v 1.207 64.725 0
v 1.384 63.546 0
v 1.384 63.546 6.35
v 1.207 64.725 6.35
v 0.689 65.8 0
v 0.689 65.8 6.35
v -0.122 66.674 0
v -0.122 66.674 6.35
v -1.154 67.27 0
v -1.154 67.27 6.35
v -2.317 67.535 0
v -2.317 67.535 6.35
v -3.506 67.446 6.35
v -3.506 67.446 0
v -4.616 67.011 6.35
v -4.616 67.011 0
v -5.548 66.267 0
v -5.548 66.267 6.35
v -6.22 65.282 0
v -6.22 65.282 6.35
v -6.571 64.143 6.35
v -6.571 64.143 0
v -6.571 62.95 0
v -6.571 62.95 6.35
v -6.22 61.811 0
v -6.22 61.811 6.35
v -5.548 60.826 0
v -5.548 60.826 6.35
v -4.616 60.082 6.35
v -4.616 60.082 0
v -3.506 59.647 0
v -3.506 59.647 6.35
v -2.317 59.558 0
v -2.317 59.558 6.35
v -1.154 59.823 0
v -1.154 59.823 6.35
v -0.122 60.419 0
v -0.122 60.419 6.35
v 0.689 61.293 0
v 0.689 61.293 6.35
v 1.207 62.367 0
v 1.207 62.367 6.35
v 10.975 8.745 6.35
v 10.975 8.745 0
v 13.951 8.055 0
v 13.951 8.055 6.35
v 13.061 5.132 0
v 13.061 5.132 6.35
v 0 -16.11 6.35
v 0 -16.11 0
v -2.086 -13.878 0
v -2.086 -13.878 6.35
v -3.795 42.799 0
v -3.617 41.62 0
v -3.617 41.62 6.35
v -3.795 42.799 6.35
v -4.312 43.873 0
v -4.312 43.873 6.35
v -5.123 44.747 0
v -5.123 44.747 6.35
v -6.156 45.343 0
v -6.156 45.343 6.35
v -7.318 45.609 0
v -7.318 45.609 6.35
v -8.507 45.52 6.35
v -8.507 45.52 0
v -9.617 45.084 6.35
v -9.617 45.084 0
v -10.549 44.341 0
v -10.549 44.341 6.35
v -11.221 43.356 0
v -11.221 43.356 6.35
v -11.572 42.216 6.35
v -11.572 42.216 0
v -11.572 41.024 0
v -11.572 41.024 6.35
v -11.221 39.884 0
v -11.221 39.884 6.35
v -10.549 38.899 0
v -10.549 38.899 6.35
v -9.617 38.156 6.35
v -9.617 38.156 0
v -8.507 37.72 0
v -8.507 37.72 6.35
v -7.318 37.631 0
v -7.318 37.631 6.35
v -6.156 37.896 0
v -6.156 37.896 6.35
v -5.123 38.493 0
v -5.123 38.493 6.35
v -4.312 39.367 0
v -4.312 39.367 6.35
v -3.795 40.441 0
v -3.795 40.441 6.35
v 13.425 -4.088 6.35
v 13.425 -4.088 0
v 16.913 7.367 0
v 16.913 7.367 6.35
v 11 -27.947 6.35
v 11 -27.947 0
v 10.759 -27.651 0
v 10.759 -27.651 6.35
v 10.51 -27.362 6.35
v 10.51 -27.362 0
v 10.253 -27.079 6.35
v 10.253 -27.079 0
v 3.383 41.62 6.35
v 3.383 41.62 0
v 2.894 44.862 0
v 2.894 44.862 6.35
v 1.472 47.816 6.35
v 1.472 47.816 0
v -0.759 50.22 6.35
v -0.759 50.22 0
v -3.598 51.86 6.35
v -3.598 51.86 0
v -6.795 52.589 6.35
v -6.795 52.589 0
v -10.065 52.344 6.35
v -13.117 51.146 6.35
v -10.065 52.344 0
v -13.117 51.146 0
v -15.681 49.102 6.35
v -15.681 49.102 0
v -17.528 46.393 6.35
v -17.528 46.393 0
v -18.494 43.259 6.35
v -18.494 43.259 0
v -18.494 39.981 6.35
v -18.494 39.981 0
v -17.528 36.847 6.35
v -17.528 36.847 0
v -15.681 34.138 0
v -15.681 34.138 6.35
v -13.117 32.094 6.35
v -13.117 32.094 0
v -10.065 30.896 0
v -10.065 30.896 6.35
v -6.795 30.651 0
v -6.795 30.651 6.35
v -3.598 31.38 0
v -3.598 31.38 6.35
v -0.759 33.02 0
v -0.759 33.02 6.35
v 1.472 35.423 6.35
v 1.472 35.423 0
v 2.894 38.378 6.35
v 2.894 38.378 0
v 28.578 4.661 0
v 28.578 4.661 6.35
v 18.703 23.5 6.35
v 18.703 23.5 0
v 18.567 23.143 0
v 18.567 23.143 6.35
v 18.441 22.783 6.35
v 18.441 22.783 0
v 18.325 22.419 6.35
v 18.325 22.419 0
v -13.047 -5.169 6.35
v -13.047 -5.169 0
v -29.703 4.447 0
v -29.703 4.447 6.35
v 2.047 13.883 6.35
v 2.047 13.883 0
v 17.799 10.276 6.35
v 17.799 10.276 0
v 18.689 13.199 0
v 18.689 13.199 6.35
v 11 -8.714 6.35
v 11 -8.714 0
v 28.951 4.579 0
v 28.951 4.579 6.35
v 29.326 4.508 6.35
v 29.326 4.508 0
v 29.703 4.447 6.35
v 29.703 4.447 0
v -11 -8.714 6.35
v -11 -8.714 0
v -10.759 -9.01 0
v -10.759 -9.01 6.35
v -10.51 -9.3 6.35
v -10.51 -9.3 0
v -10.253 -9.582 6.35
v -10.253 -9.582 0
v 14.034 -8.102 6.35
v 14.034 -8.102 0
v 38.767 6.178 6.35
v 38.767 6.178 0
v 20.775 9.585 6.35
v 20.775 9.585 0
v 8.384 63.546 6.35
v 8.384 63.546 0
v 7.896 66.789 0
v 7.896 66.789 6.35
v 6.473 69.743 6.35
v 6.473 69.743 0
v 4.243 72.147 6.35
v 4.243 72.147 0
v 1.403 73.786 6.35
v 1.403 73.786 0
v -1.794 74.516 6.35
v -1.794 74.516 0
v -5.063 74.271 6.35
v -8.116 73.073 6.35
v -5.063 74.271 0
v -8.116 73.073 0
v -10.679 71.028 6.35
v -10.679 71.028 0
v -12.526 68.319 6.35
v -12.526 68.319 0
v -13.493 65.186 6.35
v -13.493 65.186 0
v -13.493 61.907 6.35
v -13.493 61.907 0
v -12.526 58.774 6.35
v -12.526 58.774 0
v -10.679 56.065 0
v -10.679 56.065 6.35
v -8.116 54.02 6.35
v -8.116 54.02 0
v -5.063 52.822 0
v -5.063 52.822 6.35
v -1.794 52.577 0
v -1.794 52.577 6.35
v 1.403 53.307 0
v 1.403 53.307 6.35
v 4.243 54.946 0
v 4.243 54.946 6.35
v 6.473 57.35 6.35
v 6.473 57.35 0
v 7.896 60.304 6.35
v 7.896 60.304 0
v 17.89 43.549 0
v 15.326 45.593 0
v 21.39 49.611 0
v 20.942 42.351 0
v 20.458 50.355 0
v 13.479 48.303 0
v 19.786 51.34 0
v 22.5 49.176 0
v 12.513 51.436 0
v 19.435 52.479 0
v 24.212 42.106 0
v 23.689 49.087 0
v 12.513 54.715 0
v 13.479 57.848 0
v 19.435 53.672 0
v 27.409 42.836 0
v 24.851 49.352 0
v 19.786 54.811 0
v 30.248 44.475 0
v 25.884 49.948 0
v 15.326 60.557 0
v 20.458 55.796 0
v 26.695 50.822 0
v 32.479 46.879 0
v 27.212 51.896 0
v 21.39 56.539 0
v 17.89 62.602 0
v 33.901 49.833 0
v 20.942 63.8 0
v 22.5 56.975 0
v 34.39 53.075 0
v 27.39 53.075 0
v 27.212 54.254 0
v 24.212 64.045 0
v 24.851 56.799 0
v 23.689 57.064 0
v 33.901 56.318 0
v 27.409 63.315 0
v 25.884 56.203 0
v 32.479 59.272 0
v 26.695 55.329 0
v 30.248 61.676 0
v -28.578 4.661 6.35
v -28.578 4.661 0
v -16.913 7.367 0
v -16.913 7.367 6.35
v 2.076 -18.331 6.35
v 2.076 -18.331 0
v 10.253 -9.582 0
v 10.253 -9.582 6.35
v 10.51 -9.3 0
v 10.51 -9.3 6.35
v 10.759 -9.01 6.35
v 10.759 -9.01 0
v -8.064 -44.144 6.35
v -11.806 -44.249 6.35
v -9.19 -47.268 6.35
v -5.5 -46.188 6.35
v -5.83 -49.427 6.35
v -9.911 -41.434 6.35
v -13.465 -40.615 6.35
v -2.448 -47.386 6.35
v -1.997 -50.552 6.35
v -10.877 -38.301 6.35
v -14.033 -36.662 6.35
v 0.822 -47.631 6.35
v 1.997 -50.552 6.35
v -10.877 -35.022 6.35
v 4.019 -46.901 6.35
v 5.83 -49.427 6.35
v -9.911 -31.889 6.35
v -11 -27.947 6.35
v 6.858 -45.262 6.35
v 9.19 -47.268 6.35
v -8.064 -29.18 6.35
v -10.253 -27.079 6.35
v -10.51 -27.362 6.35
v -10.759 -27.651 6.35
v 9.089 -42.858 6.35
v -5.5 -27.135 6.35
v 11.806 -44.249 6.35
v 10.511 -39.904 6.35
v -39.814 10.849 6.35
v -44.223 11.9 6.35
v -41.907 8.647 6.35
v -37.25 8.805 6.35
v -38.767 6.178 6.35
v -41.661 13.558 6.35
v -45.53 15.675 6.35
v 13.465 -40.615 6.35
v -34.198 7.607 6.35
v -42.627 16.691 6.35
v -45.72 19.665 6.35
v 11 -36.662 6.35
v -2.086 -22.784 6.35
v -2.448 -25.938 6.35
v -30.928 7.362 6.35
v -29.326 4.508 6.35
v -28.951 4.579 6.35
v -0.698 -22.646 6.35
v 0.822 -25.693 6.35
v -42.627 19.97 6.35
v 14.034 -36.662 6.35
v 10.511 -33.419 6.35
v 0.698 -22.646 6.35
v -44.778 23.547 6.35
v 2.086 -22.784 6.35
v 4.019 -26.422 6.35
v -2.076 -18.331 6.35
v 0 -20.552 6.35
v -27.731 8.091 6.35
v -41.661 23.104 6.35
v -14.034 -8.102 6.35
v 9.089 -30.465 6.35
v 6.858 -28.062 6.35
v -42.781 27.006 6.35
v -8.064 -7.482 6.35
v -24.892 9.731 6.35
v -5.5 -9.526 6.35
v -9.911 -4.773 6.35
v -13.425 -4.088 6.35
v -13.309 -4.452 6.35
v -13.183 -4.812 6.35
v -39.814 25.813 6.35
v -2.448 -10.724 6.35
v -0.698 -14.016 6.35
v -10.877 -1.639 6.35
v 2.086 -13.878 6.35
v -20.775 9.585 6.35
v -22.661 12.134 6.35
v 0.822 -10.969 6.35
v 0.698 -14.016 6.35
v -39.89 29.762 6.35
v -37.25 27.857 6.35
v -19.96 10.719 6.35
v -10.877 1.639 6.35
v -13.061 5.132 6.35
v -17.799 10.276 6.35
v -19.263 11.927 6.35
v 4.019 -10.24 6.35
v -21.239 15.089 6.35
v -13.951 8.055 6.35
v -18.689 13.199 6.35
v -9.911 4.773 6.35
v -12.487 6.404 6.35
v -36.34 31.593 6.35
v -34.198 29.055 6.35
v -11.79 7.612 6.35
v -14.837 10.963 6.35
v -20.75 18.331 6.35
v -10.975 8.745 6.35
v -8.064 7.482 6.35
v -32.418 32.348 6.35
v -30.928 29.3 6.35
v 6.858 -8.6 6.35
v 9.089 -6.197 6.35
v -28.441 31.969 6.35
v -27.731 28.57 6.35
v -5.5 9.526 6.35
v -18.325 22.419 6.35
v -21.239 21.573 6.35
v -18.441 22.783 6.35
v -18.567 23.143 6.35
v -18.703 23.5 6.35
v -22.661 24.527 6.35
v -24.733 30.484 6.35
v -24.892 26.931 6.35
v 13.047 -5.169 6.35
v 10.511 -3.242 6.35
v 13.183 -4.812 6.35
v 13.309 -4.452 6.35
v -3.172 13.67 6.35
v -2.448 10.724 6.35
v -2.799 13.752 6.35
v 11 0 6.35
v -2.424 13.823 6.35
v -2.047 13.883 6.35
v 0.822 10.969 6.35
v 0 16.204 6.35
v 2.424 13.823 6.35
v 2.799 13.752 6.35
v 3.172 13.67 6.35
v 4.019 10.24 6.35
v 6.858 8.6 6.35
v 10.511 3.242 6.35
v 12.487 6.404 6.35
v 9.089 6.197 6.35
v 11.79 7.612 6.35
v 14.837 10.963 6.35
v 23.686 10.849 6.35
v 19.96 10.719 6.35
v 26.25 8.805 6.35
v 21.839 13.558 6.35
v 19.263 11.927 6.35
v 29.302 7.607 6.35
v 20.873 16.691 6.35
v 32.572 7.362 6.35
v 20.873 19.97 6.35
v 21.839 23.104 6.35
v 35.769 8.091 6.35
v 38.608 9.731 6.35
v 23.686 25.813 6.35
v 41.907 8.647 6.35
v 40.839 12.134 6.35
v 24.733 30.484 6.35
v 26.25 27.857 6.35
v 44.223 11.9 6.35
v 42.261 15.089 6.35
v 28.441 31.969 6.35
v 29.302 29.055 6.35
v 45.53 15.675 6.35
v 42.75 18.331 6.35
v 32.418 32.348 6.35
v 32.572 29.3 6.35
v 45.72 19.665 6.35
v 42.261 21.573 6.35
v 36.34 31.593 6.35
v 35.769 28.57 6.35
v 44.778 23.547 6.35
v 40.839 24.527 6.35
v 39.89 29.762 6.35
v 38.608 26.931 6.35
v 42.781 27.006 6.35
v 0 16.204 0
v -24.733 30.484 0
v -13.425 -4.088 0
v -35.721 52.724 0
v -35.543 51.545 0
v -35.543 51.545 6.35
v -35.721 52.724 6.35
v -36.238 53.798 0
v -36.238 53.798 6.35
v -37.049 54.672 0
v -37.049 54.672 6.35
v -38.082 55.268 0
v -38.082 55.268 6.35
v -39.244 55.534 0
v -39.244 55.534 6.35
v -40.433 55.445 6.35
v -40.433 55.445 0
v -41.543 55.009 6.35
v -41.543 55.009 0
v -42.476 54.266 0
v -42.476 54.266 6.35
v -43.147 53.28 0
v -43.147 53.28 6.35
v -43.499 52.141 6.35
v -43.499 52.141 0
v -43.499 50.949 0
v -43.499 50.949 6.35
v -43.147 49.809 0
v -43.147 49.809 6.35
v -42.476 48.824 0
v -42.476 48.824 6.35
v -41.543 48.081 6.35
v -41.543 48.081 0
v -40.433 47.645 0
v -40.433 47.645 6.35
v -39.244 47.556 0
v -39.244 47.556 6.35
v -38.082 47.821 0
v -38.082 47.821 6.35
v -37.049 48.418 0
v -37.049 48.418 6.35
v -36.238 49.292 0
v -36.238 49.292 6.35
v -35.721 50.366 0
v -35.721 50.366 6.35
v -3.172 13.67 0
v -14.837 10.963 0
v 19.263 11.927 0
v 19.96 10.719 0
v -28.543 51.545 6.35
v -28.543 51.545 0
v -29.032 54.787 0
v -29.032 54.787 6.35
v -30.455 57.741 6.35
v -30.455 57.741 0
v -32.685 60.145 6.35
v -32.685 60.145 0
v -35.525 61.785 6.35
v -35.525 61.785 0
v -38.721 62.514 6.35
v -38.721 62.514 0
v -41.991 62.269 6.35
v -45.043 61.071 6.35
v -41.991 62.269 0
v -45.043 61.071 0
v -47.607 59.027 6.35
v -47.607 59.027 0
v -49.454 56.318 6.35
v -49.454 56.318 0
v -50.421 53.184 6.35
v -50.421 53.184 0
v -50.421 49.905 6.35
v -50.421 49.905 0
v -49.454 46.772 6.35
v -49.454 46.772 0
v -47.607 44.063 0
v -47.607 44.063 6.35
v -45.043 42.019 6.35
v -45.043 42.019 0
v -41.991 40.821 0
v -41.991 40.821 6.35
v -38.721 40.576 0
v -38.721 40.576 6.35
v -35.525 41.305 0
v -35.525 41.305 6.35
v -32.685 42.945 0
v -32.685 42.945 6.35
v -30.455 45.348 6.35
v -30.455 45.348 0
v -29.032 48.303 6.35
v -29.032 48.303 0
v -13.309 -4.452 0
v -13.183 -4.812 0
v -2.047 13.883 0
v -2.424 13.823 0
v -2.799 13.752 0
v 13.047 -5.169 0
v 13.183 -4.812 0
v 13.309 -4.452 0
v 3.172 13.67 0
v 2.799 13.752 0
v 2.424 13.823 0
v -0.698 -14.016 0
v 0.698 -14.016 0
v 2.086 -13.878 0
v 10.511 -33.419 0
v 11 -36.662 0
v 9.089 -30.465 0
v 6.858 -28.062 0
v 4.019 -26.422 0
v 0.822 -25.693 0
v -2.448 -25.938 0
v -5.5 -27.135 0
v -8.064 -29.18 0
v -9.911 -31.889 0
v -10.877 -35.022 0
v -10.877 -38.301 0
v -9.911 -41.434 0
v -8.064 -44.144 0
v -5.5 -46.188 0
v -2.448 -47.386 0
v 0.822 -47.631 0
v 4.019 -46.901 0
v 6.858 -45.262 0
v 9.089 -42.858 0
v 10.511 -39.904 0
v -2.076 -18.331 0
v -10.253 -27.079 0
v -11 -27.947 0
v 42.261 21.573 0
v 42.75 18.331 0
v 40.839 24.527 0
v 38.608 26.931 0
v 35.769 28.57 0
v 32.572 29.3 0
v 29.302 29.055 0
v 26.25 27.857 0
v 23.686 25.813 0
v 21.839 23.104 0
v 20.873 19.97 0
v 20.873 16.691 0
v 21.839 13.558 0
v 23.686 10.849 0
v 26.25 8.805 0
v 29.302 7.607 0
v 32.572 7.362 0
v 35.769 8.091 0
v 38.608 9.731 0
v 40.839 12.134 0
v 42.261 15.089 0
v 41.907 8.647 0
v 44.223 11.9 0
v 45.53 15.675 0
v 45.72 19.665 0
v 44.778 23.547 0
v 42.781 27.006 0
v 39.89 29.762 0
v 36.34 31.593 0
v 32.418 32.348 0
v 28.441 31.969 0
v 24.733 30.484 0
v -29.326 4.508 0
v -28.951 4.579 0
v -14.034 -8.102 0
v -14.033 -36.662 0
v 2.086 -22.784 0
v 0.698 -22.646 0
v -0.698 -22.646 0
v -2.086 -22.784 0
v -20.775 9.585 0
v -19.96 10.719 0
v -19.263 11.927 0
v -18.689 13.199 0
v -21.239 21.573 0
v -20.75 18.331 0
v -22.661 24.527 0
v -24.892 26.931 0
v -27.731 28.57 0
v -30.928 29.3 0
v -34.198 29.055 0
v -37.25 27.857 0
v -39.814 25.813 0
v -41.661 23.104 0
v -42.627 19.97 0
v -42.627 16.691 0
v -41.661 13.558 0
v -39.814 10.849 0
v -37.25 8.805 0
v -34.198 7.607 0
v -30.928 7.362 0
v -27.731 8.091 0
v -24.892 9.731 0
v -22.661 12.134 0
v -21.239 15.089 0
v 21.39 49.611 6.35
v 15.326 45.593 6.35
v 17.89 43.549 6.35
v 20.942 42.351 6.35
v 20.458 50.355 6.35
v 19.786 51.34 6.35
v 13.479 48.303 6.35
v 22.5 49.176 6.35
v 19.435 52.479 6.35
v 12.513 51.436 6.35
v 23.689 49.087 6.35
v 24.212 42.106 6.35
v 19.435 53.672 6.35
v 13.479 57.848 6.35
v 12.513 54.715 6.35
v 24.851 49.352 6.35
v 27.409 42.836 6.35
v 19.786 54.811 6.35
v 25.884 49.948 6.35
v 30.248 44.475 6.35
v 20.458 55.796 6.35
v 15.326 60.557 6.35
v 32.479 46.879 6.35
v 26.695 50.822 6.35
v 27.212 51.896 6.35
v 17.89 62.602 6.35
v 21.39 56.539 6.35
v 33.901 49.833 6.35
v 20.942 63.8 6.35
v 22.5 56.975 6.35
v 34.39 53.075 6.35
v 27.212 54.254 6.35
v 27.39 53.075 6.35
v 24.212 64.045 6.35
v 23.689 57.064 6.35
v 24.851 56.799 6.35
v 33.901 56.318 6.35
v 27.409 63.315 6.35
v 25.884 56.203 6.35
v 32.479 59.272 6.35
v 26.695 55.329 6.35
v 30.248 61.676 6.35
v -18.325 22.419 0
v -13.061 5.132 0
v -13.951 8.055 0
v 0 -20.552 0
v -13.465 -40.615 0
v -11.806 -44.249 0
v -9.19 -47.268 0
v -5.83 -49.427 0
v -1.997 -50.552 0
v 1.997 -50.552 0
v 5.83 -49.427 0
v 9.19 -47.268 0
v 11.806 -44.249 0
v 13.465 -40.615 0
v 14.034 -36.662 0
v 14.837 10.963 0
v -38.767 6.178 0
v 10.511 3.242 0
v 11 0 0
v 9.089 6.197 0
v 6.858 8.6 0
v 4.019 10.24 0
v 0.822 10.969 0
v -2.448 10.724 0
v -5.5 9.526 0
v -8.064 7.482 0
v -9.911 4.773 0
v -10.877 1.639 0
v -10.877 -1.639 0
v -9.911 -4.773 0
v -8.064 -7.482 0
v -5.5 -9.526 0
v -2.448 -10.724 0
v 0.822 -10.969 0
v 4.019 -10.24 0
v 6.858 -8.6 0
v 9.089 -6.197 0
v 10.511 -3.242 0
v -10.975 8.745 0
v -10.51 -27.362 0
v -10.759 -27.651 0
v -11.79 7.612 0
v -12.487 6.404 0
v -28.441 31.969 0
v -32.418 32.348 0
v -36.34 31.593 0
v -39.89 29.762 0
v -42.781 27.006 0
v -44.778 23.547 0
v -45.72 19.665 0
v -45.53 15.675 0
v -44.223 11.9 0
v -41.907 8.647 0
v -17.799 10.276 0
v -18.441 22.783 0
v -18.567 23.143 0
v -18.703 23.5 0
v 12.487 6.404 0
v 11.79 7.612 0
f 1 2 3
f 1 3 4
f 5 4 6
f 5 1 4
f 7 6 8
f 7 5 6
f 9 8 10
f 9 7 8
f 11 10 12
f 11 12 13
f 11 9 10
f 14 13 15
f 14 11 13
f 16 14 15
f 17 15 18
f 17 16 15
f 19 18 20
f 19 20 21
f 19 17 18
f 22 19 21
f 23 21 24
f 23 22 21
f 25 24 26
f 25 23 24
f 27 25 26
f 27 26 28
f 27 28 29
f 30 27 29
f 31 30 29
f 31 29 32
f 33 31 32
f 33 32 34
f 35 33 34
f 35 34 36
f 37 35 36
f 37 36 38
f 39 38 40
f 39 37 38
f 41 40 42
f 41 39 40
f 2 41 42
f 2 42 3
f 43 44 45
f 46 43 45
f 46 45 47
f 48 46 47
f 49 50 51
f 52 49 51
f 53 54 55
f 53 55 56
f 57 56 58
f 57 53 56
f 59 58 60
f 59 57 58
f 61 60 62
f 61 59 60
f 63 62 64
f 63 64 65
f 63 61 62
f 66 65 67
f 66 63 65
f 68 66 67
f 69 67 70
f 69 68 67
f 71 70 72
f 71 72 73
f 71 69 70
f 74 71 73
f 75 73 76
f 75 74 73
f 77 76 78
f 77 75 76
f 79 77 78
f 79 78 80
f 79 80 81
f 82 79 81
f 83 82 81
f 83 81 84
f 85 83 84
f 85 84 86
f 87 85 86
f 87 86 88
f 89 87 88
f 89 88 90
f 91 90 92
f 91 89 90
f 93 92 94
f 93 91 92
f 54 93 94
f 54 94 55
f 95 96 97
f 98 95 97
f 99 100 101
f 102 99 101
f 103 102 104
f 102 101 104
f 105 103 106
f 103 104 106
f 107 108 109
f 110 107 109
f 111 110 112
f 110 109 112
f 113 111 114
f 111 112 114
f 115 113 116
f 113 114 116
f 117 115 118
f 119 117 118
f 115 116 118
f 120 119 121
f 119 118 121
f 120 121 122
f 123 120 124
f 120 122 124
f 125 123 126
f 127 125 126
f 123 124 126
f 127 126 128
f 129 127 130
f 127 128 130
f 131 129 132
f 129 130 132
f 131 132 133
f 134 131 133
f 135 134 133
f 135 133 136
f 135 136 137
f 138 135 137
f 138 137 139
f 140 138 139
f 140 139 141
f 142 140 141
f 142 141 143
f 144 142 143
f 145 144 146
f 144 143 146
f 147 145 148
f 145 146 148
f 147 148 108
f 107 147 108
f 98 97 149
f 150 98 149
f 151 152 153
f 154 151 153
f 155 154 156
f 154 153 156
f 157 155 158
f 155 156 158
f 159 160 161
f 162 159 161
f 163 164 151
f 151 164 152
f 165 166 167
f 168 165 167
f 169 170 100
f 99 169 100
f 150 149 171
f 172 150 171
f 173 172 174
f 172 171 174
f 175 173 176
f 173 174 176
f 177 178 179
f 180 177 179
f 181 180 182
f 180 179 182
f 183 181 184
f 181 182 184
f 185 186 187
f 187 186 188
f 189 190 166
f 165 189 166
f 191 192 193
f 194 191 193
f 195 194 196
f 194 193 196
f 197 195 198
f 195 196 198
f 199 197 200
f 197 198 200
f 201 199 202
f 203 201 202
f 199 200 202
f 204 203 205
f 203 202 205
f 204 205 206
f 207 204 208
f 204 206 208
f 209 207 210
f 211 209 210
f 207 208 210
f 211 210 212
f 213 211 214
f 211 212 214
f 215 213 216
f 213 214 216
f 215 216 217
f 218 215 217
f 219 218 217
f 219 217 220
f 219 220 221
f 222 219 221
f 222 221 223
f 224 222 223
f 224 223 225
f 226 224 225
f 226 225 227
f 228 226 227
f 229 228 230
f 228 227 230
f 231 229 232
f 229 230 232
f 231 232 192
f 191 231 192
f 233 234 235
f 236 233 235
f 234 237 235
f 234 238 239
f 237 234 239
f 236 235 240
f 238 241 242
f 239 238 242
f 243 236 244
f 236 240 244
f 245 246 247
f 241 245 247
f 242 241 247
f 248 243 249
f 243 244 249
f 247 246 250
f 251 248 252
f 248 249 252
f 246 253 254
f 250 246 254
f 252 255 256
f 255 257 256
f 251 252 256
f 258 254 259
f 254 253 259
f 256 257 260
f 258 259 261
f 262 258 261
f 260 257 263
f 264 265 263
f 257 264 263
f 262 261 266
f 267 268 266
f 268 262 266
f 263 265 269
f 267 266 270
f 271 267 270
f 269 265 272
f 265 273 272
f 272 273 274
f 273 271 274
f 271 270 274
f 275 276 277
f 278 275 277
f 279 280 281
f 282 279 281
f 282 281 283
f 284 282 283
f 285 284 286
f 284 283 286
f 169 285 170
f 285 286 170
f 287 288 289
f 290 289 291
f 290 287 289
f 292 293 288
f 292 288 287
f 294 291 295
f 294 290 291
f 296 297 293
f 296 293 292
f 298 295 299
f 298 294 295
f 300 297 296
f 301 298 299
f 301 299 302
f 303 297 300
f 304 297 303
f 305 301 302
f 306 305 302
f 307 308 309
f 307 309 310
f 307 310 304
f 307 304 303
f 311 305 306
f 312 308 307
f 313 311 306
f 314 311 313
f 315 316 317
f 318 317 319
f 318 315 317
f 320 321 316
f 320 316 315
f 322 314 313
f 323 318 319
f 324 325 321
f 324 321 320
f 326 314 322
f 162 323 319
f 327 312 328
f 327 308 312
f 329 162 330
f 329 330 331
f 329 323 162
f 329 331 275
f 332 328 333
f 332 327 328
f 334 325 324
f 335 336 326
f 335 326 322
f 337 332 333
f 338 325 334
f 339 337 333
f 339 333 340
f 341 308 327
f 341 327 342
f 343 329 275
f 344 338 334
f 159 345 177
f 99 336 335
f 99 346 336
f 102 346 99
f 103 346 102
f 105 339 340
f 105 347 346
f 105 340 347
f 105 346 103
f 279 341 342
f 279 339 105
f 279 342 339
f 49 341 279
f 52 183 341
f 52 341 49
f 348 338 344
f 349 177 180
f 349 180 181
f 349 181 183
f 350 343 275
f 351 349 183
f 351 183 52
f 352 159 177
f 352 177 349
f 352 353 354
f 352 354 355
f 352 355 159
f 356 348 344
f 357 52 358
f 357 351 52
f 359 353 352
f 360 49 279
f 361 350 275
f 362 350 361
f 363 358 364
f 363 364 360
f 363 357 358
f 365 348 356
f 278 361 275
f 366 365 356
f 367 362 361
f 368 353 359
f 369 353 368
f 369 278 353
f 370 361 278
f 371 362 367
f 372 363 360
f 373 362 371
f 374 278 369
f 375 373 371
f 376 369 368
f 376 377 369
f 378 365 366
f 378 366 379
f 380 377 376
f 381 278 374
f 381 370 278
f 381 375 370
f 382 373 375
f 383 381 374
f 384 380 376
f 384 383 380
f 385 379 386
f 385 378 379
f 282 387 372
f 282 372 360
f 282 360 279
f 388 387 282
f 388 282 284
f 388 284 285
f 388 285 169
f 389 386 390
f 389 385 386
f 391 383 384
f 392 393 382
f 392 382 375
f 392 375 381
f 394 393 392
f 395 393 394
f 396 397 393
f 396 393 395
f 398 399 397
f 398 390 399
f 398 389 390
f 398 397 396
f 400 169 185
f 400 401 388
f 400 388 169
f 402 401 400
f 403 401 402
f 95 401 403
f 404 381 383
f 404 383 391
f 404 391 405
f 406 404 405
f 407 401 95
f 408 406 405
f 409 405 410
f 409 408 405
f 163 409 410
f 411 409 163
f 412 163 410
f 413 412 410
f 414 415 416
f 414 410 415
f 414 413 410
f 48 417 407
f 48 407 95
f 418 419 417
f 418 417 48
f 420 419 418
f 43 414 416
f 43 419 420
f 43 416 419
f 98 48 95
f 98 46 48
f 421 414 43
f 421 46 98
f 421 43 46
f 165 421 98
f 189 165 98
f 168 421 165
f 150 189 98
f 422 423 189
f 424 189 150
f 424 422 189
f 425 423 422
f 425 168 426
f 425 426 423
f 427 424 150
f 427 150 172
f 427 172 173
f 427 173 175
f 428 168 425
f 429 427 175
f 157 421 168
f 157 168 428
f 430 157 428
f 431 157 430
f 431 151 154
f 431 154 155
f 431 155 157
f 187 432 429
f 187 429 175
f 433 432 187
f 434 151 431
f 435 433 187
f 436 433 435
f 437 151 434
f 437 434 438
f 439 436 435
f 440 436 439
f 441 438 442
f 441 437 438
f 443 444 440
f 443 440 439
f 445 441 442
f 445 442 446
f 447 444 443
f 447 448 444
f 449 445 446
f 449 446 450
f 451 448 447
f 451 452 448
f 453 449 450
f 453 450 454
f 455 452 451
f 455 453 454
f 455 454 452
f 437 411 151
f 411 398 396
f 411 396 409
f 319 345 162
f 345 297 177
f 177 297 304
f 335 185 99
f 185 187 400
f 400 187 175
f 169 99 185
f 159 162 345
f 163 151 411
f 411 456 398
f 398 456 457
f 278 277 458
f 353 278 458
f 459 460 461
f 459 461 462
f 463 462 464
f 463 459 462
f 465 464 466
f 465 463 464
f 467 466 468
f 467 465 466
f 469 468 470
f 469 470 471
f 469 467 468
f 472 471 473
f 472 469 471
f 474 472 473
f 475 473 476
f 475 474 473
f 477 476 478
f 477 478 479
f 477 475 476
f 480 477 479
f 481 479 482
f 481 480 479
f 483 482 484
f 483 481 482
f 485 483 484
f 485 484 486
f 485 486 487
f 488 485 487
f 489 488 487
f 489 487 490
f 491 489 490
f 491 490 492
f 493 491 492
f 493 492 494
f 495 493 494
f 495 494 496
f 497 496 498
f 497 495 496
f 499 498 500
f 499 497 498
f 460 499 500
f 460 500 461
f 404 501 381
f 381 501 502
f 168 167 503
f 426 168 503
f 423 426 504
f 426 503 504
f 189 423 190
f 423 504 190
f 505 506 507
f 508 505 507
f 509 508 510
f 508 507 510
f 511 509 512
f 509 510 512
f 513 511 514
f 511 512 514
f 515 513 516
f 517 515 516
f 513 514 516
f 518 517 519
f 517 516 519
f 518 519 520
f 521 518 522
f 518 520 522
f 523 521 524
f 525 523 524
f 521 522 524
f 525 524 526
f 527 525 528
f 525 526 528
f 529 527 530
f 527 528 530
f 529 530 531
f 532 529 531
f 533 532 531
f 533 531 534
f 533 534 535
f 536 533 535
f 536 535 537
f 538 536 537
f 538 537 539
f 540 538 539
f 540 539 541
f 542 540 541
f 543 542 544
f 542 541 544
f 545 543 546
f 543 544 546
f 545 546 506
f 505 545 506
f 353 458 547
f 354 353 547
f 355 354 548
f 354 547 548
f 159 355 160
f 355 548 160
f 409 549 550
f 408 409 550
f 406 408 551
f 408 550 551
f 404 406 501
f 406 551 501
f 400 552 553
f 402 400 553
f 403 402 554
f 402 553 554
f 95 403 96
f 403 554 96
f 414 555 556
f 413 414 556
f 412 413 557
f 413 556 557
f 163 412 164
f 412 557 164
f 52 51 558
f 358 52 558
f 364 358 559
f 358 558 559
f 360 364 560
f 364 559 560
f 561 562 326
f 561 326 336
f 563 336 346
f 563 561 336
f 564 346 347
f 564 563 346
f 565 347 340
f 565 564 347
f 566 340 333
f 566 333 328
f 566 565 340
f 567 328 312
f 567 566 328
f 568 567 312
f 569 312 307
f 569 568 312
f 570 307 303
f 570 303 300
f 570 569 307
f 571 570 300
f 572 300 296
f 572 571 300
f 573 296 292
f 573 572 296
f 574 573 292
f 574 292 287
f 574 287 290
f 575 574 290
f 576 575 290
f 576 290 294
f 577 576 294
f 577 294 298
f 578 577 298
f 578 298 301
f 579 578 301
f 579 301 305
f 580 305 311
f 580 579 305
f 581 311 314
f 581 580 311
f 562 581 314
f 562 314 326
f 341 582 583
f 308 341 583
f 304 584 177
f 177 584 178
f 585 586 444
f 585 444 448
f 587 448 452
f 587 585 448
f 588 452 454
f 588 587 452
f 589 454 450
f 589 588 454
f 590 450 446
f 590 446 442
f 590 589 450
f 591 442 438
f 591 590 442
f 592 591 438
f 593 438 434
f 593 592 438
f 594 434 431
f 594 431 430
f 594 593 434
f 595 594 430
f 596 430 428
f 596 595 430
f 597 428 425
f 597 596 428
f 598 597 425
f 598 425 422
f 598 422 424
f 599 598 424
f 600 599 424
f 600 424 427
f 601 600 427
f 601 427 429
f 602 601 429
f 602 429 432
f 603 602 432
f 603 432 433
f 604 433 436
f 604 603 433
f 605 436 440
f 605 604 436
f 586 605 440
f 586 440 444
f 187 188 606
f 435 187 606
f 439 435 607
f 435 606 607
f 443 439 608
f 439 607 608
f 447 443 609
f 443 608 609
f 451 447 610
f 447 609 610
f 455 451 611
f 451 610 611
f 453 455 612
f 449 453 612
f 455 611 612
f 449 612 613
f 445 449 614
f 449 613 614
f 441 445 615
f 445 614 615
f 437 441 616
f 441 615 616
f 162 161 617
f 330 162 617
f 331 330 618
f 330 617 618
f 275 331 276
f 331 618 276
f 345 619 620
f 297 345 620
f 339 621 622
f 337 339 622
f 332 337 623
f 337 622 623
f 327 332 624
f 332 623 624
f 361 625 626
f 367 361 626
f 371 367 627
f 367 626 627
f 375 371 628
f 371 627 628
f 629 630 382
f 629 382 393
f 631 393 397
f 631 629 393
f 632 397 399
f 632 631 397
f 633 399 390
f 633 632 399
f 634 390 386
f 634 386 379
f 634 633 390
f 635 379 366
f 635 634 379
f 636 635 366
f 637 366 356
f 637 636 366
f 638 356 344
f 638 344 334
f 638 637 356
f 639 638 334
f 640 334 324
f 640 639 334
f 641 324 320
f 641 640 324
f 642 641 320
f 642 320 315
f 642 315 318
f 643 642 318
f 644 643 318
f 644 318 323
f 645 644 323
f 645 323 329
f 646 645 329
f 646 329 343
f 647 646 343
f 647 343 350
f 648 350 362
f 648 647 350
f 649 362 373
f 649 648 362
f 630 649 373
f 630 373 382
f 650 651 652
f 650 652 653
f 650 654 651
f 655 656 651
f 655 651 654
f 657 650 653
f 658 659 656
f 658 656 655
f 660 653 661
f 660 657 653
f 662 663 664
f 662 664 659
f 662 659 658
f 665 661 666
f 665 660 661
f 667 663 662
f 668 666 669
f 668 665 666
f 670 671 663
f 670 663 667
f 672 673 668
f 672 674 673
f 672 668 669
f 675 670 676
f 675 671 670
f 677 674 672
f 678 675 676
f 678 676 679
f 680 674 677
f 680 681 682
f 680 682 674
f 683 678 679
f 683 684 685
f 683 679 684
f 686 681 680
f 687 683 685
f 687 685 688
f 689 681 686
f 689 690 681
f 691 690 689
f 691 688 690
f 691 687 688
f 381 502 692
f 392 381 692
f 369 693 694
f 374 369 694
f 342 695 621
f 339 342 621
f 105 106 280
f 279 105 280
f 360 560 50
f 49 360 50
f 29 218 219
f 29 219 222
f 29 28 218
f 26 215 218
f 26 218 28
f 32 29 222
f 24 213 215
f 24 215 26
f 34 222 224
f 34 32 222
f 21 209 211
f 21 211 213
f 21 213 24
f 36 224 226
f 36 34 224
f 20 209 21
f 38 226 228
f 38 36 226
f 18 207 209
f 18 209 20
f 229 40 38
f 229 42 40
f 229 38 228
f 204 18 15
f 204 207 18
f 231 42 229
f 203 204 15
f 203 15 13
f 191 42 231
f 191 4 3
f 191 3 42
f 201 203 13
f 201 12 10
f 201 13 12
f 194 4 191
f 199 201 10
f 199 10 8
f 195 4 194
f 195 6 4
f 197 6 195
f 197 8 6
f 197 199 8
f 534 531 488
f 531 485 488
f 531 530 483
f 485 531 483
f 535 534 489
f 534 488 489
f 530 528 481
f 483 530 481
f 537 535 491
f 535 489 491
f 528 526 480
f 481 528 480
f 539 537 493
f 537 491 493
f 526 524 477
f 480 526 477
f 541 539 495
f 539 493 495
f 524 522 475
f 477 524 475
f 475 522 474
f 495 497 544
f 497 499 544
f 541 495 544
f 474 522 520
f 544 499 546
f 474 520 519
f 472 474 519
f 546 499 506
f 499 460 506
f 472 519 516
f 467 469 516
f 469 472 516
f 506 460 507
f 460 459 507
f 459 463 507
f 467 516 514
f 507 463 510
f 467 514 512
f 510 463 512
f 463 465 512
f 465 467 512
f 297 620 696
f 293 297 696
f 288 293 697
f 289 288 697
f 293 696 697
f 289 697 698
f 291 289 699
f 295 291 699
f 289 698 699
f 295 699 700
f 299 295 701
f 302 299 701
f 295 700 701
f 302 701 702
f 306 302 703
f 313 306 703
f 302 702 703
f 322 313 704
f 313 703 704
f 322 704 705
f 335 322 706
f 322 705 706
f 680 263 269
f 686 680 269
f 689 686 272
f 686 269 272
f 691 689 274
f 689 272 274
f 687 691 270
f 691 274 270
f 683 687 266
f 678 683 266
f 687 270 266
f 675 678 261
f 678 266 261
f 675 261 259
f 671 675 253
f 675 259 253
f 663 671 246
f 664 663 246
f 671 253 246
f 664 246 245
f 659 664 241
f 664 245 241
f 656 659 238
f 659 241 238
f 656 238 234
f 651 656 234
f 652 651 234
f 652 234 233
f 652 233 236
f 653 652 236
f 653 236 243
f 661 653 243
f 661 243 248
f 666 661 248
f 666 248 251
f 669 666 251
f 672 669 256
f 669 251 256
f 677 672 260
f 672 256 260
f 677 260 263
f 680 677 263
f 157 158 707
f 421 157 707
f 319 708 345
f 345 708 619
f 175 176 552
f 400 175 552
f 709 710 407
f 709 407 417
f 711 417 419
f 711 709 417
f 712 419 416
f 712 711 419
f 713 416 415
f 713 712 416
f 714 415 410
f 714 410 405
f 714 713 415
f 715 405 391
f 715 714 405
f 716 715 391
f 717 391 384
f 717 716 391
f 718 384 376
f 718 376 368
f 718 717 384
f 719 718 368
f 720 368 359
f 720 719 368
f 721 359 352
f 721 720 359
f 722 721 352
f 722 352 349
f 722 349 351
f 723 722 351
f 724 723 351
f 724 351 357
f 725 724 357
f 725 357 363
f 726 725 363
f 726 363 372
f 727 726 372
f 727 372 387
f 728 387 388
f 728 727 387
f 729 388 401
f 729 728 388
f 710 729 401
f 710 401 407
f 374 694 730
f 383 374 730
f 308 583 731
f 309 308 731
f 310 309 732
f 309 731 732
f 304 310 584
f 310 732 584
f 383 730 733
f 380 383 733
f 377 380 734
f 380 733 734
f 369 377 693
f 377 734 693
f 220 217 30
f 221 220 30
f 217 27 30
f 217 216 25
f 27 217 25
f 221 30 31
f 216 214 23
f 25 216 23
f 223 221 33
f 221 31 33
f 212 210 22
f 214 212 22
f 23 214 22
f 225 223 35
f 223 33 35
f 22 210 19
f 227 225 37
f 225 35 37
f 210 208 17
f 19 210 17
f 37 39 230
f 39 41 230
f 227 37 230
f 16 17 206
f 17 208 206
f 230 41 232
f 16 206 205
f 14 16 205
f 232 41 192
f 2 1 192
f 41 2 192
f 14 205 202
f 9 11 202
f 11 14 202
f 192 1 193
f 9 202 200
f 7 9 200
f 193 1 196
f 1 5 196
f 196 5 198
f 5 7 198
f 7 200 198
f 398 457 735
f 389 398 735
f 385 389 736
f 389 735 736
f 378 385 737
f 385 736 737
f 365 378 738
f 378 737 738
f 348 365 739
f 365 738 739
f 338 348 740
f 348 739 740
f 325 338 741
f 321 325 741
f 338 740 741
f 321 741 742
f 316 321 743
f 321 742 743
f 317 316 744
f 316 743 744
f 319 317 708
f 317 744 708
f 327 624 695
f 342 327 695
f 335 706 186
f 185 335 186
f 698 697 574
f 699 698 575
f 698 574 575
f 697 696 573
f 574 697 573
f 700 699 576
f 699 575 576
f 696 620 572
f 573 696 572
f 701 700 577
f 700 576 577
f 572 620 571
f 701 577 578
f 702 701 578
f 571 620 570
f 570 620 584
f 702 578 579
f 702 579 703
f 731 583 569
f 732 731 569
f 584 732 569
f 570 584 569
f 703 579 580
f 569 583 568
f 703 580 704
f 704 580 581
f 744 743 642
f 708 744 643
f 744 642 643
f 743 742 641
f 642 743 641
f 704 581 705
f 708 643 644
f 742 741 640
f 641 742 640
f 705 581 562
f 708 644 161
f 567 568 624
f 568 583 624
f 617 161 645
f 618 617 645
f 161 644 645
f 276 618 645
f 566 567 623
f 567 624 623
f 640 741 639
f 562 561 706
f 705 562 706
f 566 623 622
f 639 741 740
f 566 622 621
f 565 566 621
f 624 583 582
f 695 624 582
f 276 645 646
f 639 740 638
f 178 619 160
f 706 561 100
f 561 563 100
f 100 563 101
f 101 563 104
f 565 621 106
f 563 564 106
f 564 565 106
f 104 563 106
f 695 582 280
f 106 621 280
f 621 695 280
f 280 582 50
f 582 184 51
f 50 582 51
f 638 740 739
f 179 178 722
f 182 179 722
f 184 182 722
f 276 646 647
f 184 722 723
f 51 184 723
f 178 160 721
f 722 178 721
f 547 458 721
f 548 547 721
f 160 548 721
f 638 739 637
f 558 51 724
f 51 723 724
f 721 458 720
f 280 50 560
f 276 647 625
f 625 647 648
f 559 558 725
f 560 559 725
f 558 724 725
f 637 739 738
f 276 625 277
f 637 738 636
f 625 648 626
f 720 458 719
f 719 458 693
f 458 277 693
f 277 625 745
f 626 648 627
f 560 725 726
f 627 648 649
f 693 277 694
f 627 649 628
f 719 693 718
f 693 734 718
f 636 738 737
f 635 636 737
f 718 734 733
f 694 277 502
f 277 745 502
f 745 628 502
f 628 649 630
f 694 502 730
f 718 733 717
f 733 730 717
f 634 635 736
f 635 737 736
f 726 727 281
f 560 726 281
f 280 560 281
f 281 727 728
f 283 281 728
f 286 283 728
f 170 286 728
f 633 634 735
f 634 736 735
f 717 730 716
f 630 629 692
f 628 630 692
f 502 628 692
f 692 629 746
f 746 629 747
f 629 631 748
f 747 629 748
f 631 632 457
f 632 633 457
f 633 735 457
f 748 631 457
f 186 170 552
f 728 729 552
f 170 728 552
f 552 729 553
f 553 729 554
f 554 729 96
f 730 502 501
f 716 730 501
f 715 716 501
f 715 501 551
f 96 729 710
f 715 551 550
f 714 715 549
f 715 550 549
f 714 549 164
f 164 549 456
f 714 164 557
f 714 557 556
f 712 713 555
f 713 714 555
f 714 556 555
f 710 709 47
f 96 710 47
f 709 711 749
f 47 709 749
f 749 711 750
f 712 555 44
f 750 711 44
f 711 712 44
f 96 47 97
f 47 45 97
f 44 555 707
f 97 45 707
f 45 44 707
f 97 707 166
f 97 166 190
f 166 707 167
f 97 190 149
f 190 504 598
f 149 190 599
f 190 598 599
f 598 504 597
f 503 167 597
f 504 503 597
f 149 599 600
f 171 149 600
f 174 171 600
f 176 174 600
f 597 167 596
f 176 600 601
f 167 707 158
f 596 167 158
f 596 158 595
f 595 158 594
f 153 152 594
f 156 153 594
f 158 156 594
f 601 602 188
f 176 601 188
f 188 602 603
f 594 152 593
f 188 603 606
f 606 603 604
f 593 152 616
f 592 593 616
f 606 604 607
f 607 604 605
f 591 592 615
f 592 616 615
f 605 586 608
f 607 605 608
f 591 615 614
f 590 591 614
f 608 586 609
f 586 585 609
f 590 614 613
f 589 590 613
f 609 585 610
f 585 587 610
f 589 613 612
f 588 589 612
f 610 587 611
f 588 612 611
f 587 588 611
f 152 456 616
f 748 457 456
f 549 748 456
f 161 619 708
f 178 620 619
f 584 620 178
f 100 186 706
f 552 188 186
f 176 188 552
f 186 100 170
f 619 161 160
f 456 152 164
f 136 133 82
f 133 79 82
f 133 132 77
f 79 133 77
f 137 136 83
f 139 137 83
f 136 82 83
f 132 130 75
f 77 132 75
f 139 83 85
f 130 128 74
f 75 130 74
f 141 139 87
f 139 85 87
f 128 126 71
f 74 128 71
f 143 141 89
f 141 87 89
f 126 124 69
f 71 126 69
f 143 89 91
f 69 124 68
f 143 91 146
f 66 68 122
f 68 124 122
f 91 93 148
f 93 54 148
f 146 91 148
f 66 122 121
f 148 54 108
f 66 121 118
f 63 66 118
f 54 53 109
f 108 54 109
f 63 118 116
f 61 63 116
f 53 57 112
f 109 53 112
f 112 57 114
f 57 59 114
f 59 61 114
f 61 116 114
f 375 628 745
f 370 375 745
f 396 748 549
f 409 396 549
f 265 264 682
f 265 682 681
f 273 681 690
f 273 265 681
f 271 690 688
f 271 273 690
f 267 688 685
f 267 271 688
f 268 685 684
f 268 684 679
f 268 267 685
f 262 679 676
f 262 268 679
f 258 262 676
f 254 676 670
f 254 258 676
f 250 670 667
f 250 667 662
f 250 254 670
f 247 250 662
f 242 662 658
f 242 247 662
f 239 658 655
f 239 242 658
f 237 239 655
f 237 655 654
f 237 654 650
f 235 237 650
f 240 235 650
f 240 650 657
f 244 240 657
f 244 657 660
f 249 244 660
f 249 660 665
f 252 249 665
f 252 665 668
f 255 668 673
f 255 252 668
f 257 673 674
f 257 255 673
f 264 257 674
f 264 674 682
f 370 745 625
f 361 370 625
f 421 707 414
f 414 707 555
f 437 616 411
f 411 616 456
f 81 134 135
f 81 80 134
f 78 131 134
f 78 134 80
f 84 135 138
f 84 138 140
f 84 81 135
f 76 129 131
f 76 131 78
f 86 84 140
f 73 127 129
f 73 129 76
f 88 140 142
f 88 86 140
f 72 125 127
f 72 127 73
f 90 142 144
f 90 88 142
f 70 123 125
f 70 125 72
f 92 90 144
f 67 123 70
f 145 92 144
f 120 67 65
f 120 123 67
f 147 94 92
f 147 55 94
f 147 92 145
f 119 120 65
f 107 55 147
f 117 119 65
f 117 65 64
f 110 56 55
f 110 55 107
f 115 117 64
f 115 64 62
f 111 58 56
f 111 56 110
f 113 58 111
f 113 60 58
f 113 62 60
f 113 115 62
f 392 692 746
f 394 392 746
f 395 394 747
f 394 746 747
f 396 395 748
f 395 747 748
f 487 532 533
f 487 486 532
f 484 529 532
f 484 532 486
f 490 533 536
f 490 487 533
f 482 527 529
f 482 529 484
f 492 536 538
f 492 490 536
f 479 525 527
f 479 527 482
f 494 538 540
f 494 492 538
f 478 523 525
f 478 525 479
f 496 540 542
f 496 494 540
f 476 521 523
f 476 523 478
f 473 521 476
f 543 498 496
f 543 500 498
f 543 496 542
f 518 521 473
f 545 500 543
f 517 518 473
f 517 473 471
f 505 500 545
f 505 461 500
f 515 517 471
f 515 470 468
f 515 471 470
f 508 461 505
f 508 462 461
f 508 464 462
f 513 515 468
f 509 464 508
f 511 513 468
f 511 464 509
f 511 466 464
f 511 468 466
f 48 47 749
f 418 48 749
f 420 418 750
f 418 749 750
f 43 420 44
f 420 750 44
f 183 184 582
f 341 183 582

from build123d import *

# Parameters (mm, degrees)
F0_R     = 11
F0_R_2   = 4
F1_DEPTH = 6.35


with BuildPart() as f1:
    # F0 (on Top) → F1 (new body)
    with BuildSketch(Plane.XY):
        with BuildLine():
            Line((24.73325, 30.484239), (0, 16.20449))
            Line((0, 16.20449), (-24.73325, 30.484239))
            ThreePointArc((-24.73325, 30.484239), (-43.903368, 25.347621), (-38.76675, 6.177504))
            Line((-38.76675, 6.177504), (-14.0335, -8.102245))
            Line((-14.0335, -8.102245), (-14.0335, -36.661742))
            ThreePointArc((-14.0335, -36.661742), (0, -50.695242), (14.0335, -36.661742))
            Line((14.0335, -36.661742), (14.0335, -8.102245))
            Line((14.0335, -8.102245), (38.76675, 6.177504))
            ThreePointArc((38.76675, 6.177504), (43.903368, 25.347621), (24.73325, 30.484239))
        make_face()
        with BuildLine():
            Line((-2.076081, -18.330871), (-10.252641, -27.079338))
            ThreePointArc((-10.252641, -27.079338), (-10.635182, -27.505759), (-11, -27.947436))
            Line((-11, -27.947436), (-11, -8.714306))
            ThreePointArc((-11, -8.714306), (-10.635182, -9.155983), (-10.252641, -9.582404))
            Line((-10.252641, -9.582404), (-2.076081, -18.330871))
        make_face(mode=Mode.SUBTRACT)
        with BuildLine():
            Line((-16.91304, 7.367497), (-13.424926, -4.087846))
            ThreePointArc((-13.424926, -4.087846), (-13.246905, -4.632346), (-13.04681, -5.169127))
            Line((-13.04681, -5.169127), (-29.70319, 4.447439))
            ThreePointArc((-29.70319, 4.447439), (-29.138277, 4.542542), (-28.577715, 4.660621))
            Line((-28.577715, 4.660621), (-16.91304, 7.367497))
        make_face(mode=Mode.SUBTRACT)
        with BuildLine():
            Line((-17.798695, 10.276081), (-20.774701, 9.585477))
            ThreePointArc((-20.774701, 9.585477), (-19.596632, 11.314121), (-18.688617, 13.19868))
            Line((-18.688617, 13.19868), (-17.798695, 10.276081))
        make_face(mode=Mode.SUBTRACT)
        with BuildLine():
            Line((-13.061383, 5.132191), (-13.951305, 8.05479))
            Line((-13.951305, 8.05479), (-10.975299, 8.745394))
            ThreePointArc((-10.975299, 8.745394), (-12.153368, 7.01675), (-13.061383, 5.132191))
        make_face(mode=Mode.SUBTRACT)
        with Locations((0, -36.661742)):
            Circle(F0_R, mode=Mode.SUBTRACT)
        with BuildLine():
            ThreePointArc((2.086084, -22.784157), (0, -22.628242), (-2.086084, -22.784157))
            Line((-2.086084, -22.784157), (0, -20.552162))
            Line((0, -20.552162), (2.086084, -22.784157))
        make_face(mode=Mode.SUBTRACT)
        with BuildLine():
            Line((0, -16.10958), (-2.086084, -13.877585))
            ThreePointArc((-2.086084, -13.877585), (0, -14.0335), (2.086084, -13.877585))
            Line((2.086084, -13.877585), (0, -16.10958))
        make_face(mode=Mode.SUBTRACT)
        with BuildLine():
            Line((11, -8.714306), (11, -27.947436))
            ThreePointArc((11, -27.947436), (10.635182, -27.505759), (10.252641, -27.079338))
            Line((10.252641, -27.079338), (2.076081, -18.330871))
            Line((2.076081, -18.330871), (10.252641, -9.582404))
            ThreePointArc((10.252641, -9.582404), (10.635182, -9.155983), (11, -8.714306))
        make_face(mode=Mode.SUBTRACT)
        Circle(F0_R, mode=Mode.SUBTRACT)
        with BuildLine():
            Line((29.70319, 4.447439), (13.04681, -5.169127))
            ThreePointArc((13.04681, -5.169127), (13.246905, -4.632346), (13.424926, -4.087846))
            Line((13.424926, -4.087846), (16.91304, 7.367497))
            Line((16.91304, 7.367497), (28.577715, 4.660621))
            ThreePointArc((28.577715, 4.660621), (29.138277, 4.542542), (29.70319, 4.447439))
        make_face(mode=Mode.SUBTRACT)
        with BuildLine():
            Line((13.951305, 8.05479), (13.061383, 5.132191))
            ThreePointArc((13.061383, 5.132191), (12.153368, 7.01675), (10.975299, 8.745394))
            Line((10.975299, 8.745394), (13.951305, 8.05479))
        make_face(mode=Mode.SUBTRACT)
        with BuildLine():
            Line((17.798695, 10.276081), (18.688617, 13.19868))
            ThreePointArc((18.688617, 13.19868), (19.596632, 11.314121), (20.774701, 9.585477))
            Line((20.774701, 9.585477), (17.798695, 10.276081))
        make_face(mode=Mode.SUBTRACT)
        with Locations((-31.75, 18.330871)):
            Circle(F0_R, mode=Mode.SUBTRACT)
        with BuildLine():
            Line((-14.83696, 10.963374), (-18.325074, 22.418717))
            ThreePointArc((-18.325074, 22.418717), (-18.503095, 22.963217), (-18.70319, 23.499998))
            Line((-18.70319, 23.499998), (-2.04681, 13.883432))
            ThreePointArc((-2.04681, 13.883432), (-2.611723, 13.788329), (-3.172285, 13.67025))
            Line((-3.172285, 13.67025), (-14.83696, 10.963374))
        make_face(mode=Mode.SUBTRACT)
        with BuildLine():
            ThreePointArc((3.172285, 13.67025), (2.611723, 13.788329), (2.04681, 13.883432))
            Line((2.04681, 13.883432), (18.70319, 23.499998))
            ThreePointArc((18.70319, 23.499998), (18.503095, 22.963217), (18.325074, 22.418717))
            Line((18.325074, 22.418717), (14.83696, 10.963374))
            Line((14.83696, 10.963374), (3.172285, 13.67025))
        make_face(mode=Mode.SUBTRACT)
        with Locations((31.75, 18.330871)):
            Circle(F0_R, mode=Mode.SUBTRACT)
        with Locations((-39.543405, 51.544905)):
            Circle(F0_R)
        with Locations((-39.543405, 51.544905)):
            Circle(F0_R_2, mode=Mode.SUBTRACT)
        with Locations((-7.616933, 41.619973)):
            Circle(F0_R)
        with Locations((-7.616933, 41.619973)):
            Circle(F0_R_2, mode=Mode.SUBTRACT)
        with Locations((-2.615711, 63.546404)):
            Circle(F0_R)
        with Locations((-2.615711, 63.546404)):
            Circle(F0_R_2, mode=Mode.SUBTRACT)
        with Locations((23.389939, 53.075364)):
            Circle(F0_R)
        with Locations((23.389939, 53.075364)):
            Circle(F0_R_2, mode=Mode.SUBTRACT)
    extrude(amount=F1_DEPTH)


solid = f1.part
